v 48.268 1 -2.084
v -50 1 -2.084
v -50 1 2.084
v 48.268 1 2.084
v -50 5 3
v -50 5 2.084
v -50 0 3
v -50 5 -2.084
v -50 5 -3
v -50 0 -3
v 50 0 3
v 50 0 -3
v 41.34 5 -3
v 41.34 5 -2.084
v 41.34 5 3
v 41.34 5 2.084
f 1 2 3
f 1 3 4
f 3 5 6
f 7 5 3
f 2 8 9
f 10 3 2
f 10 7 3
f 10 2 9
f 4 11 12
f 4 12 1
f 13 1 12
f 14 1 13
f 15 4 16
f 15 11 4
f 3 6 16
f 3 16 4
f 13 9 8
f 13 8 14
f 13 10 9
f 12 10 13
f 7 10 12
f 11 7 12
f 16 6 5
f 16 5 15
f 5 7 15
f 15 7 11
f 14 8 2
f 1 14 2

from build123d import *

# Parameters (mm, degrees)
SKETCH1_W           = 100
SKETCH1_H           = 6
BOSS_EXTRUDE1_DEPTH = 5
SKETCH2_W           = 100
SKETCH2_H           = 4.1675
CUT_EXTRUDE1_DEPTH  = 4
CUT_EXTRUDE2_DEPTH  = 20


with BuildPart() as part:
    # Sketch1 → Boss-Extrude1 (new body)
    with BuildSketch(Plane(origin=(0, 0, 0), x_dir=(1, 0, 0), z_dir=(0, 1, 0))):
        Rectangle(SKETCH1_W, SKETCH1_H)
    extrude(amount=BOSS_EXTRUDE1_DEPTH)

    # Sketch2 → Cut-Extrude1 (cut)
    with BuildSketch(Plane(origin=(0, 5, 0), x_dir=(1, 0, 0), z_dir=(0, 1, 0))):
        Rectangle(SKETCH2_W, SKETCH2_H)
    extrude(amount=-CUT_EXTRUDE1_DEPTH, mode=Mode.SUBTRACT)

    # Sketch3 → Cut-Extrude2 (cut)
    with BuildSketch(Plane.XY.offset(3)):
        Polygon((50, 0), (41.339745962, 5), (50, 5), align=None)
    extrude(amount=-CUT_EXTRUDE2_DEPTH, mode=Mode.SUBTRACT)


solid = part.part
